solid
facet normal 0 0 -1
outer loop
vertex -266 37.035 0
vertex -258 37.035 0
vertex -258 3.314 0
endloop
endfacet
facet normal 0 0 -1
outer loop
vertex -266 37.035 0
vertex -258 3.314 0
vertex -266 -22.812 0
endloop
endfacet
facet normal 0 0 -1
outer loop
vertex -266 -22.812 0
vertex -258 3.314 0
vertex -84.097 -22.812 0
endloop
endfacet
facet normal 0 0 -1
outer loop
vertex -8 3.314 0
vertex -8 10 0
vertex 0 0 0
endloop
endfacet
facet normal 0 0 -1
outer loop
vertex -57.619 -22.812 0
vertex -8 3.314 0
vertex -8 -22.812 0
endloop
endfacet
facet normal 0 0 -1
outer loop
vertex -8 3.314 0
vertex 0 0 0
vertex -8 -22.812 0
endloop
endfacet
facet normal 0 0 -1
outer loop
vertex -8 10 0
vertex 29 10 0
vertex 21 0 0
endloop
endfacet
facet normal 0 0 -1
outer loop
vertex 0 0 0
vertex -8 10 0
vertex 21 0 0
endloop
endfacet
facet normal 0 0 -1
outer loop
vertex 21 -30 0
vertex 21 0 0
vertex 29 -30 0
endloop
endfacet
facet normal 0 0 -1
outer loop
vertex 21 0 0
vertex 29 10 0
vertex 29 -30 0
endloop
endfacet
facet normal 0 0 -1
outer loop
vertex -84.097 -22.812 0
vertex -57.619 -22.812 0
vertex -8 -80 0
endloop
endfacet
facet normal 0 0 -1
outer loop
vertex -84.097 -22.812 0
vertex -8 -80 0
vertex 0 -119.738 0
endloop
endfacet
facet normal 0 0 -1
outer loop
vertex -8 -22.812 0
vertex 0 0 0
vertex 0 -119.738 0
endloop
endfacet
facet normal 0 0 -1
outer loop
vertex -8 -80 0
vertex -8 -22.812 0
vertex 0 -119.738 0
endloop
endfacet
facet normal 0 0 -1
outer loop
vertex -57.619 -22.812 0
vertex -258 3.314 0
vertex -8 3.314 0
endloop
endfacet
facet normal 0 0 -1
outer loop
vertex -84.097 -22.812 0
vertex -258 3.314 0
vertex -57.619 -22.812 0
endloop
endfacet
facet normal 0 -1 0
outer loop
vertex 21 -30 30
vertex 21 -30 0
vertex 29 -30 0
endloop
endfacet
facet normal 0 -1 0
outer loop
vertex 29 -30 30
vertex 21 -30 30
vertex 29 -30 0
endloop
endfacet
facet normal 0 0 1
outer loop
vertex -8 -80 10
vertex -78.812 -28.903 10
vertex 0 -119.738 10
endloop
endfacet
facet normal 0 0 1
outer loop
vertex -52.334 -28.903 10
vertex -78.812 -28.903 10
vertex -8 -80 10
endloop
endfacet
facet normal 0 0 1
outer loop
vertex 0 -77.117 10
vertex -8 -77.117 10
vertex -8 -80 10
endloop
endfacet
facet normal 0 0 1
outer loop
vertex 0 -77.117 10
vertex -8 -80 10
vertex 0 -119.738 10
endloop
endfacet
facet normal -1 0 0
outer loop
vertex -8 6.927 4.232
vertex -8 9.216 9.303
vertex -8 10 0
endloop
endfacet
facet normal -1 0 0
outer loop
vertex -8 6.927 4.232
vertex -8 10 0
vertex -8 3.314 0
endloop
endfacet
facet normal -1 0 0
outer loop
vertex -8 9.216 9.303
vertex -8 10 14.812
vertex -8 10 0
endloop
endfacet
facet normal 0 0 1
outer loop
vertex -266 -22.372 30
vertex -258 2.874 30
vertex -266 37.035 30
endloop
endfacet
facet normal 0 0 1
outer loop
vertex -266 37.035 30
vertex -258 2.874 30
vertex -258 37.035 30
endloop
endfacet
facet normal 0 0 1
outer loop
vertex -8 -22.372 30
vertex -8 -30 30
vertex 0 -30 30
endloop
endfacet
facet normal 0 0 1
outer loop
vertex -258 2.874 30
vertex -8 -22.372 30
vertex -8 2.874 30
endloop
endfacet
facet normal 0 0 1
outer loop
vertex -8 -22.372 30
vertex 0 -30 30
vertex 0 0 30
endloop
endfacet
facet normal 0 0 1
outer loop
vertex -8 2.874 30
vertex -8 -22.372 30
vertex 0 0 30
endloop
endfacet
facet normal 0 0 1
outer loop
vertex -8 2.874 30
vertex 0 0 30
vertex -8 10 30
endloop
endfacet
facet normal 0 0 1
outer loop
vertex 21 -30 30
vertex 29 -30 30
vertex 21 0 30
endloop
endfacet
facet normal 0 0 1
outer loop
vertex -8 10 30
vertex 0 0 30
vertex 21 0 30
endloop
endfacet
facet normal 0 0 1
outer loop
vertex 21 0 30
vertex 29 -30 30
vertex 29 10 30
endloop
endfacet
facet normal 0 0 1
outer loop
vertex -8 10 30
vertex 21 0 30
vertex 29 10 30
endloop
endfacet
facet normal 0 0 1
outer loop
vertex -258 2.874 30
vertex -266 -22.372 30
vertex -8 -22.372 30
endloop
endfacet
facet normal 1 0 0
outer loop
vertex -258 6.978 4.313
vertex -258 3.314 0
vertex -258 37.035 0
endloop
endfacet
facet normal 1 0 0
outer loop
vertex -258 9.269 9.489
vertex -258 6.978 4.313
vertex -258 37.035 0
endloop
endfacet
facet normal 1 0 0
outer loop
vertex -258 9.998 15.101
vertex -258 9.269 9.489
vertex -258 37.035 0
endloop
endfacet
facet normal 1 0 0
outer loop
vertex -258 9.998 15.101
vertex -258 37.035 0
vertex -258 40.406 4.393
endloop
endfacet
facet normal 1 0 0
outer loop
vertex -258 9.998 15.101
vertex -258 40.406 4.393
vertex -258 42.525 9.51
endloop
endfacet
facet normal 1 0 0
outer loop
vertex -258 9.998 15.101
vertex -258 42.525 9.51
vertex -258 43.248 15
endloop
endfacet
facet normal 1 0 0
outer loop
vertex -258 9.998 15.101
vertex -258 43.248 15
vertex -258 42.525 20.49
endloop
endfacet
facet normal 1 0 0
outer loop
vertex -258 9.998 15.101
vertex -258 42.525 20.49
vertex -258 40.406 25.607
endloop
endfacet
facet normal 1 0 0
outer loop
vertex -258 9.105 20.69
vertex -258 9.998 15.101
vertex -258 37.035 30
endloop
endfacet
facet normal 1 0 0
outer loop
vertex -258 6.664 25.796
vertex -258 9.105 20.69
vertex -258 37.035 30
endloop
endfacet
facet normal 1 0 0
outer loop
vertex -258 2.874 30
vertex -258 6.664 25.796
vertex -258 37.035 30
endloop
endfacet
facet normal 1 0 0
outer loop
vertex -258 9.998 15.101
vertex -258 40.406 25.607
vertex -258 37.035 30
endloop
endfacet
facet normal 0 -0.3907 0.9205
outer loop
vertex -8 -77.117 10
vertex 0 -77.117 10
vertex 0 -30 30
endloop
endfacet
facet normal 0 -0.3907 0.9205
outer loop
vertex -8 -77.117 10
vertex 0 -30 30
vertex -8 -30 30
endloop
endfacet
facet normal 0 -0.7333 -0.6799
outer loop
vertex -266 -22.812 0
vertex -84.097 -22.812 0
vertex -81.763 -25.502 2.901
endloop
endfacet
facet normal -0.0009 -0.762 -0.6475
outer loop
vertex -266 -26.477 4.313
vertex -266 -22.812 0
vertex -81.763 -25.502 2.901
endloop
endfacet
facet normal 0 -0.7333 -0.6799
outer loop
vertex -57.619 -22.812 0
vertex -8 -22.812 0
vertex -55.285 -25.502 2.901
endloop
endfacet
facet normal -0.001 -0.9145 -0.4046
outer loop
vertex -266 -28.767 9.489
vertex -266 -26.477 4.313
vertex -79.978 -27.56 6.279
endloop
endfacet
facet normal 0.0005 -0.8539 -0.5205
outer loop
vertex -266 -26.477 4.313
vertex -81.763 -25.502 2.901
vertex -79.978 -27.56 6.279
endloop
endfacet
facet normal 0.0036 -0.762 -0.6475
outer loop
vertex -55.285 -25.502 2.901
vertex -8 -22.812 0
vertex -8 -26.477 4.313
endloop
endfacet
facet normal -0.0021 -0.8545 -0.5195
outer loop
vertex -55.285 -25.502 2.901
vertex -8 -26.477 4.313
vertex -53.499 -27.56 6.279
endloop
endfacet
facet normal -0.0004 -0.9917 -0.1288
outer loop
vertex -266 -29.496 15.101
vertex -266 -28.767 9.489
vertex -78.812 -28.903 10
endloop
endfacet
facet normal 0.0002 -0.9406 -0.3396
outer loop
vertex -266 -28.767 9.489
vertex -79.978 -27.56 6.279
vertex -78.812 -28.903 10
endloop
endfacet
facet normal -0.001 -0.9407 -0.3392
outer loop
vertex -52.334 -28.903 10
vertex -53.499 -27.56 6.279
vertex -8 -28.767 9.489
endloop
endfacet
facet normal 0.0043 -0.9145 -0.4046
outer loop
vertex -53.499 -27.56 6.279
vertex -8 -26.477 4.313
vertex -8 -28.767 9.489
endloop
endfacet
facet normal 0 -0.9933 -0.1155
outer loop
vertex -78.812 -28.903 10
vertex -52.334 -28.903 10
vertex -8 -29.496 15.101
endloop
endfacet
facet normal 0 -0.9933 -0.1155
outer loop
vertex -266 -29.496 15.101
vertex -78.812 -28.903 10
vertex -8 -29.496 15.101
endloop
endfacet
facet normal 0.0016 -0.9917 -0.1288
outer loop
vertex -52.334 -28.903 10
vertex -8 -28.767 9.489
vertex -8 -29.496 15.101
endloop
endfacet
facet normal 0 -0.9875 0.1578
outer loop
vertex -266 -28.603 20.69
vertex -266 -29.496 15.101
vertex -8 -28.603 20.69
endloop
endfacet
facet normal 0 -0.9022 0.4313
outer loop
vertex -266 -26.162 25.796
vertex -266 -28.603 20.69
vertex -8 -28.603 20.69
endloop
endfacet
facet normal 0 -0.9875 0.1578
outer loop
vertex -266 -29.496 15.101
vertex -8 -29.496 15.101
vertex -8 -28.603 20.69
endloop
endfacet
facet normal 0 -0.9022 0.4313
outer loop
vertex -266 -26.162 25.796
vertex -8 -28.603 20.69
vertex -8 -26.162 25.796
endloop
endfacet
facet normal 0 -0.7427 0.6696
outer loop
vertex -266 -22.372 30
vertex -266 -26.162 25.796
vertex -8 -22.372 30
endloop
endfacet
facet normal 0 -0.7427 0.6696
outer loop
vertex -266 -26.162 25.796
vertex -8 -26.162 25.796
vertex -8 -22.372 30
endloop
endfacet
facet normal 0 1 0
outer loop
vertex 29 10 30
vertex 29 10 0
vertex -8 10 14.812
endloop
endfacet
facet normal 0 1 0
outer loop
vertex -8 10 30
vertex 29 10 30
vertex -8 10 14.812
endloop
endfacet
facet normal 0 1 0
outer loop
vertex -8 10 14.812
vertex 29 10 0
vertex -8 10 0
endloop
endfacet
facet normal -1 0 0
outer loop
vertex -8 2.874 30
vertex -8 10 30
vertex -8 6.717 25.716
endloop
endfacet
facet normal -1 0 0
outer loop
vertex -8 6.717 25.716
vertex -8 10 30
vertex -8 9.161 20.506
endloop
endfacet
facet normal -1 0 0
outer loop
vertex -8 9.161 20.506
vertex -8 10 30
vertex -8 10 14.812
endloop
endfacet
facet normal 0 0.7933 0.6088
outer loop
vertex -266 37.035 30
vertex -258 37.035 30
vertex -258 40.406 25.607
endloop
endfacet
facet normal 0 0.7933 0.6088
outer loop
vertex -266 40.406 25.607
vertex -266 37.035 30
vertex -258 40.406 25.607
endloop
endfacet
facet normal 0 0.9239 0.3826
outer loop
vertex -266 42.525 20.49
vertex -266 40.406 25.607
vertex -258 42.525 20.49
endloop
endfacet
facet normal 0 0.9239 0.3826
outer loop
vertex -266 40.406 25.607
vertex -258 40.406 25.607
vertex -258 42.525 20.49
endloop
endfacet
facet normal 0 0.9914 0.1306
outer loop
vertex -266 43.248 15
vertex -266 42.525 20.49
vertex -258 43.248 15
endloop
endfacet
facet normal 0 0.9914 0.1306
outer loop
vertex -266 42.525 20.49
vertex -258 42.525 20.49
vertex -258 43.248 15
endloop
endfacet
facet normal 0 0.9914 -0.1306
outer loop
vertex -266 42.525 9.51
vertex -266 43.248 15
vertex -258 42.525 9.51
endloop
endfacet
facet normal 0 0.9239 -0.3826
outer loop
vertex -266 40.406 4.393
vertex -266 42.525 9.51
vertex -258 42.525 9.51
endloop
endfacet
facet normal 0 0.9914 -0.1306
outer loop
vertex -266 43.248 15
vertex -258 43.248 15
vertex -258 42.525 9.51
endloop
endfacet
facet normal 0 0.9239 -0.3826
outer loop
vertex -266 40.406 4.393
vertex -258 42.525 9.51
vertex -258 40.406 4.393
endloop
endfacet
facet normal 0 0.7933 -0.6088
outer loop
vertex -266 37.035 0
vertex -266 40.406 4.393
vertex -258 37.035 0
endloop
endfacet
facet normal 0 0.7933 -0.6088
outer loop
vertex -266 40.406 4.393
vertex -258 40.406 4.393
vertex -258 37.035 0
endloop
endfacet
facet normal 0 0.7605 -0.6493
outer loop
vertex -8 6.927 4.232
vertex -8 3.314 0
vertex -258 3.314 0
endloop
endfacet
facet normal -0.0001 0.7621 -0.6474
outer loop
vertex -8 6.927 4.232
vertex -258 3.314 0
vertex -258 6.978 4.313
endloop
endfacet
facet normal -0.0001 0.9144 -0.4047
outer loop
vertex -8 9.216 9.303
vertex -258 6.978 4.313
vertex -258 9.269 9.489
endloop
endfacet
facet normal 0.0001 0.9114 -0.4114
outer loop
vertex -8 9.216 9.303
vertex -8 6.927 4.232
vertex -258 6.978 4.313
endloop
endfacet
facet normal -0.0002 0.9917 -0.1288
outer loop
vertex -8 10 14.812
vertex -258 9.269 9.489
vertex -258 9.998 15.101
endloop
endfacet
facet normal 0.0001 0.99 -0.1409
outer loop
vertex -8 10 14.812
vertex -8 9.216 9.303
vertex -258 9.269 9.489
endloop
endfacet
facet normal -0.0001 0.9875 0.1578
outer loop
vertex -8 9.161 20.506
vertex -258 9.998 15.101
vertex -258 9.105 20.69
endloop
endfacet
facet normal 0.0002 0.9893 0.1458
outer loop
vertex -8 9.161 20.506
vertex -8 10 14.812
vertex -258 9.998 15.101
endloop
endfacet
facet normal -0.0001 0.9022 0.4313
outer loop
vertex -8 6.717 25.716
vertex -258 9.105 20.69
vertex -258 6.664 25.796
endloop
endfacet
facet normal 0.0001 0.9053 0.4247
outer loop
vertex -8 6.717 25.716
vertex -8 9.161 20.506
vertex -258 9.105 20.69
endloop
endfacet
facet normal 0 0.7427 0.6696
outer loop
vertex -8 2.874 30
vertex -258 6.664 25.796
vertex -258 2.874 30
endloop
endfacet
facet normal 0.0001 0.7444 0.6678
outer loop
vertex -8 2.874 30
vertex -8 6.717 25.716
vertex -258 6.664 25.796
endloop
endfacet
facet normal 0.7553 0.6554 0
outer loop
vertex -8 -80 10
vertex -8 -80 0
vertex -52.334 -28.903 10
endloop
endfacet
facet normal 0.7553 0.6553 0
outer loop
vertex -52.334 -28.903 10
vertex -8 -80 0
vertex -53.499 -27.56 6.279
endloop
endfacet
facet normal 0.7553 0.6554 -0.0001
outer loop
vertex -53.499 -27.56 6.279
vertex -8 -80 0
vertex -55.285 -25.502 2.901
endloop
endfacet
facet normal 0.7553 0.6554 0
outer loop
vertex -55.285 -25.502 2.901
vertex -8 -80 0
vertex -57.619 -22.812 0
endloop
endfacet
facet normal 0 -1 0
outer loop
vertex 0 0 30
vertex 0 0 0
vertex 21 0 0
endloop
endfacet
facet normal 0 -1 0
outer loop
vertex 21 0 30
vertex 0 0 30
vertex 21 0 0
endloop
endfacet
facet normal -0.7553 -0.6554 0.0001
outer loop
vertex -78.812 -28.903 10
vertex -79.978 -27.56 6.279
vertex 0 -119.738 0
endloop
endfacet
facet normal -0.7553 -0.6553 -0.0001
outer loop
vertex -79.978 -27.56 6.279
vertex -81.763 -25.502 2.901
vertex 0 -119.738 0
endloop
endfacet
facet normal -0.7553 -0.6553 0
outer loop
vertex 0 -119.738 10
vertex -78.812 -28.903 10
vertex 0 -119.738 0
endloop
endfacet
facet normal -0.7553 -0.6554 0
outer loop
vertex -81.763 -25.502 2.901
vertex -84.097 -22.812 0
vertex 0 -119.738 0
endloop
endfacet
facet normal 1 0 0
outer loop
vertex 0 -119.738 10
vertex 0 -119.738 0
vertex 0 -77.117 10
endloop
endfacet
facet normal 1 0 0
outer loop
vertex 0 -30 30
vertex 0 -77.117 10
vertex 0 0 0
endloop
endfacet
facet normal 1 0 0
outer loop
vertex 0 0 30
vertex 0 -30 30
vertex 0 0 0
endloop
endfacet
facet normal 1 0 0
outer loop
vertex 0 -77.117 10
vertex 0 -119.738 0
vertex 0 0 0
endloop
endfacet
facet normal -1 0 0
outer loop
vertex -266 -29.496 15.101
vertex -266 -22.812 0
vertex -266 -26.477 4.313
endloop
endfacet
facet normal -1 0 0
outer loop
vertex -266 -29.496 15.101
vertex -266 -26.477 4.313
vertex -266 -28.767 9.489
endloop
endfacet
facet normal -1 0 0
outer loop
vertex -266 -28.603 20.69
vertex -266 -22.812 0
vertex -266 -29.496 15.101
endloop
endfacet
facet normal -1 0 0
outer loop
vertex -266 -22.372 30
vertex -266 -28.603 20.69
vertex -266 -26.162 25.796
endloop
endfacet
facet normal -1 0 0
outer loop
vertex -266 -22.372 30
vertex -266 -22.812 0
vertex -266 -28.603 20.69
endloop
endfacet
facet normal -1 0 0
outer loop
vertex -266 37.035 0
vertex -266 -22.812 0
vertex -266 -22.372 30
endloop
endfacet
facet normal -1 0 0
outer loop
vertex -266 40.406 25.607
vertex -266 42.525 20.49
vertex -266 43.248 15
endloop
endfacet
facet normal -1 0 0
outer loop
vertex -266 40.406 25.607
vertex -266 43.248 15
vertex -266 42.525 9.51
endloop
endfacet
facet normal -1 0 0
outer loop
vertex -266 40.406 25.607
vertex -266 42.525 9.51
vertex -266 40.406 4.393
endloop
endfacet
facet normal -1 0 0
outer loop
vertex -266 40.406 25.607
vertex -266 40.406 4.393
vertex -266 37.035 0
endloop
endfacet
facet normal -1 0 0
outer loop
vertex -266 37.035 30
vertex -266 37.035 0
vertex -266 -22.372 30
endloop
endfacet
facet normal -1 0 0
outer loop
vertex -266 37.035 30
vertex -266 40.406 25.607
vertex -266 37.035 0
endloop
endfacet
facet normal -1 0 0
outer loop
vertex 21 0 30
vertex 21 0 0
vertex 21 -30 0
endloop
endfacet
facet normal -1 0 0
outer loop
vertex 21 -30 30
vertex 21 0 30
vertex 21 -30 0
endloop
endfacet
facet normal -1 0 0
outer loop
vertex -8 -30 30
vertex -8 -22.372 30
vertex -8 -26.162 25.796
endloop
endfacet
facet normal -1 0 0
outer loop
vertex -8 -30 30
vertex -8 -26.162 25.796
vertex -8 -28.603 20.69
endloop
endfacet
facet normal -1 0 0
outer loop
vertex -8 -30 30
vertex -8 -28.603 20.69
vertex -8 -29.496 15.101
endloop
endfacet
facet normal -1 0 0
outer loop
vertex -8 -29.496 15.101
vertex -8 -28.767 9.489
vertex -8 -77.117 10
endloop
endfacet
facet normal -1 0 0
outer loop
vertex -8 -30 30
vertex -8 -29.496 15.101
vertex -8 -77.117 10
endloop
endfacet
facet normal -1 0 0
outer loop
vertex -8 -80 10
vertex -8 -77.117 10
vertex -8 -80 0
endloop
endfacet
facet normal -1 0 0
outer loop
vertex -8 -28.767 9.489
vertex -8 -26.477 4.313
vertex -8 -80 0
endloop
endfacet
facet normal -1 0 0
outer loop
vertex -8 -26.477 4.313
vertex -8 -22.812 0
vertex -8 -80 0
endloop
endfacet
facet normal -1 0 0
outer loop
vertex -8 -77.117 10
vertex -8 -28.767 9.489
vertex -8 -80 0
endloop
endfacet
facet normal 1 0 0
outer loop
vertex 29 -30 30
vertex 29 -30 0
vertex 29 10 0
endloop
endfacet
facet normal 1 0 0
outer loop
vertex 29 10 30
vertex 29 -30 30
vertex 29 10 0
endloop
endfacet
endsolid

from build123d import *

# Parameters (mm, degrees)
BOSS_EXTRUDE1_DEPTH = 30
BOSS_EXTRUDE2_DEPTH = 250
BOSS_EXTRUDE3_DEPTH = 8
BOSS_EXTRUDE4_DEPTH = 10
CHAMFER1_SIZE2      = 47.117047316
CHAMFER1_SIZE       = 20


with BuildPart() as part:
    # Sketch1 → Boss-Extrude1 (new body)
    with BuildSketch(Plane.XY):
        Polygon((0, 0), (21, 0), (21, -30), (29, -30), (29, 10), (-8, 10), (-8, -30), (0, -30), align=None)
    extrude(amount=BOSS_EXTRUDE1_DEPTH)

    # Sketch2 → Boss-Extrude2 (add)
    with BuildSketch(Plane.ZY.offset(8)):
        with BuildLine():
            Line((0, -22.811969958), (0, 3.313687916))
            ThreePointArc((0, 3.313687916), (15.101138891, 9.997881194), (30, 2.874204248))
            Line((30, 2.874204248), (30, -22.37248629))
            ThreePointArc((30, -22.37248629), (15.101138891, -29.496163235), (0, -22.811969958))
        make_face()
    extrude(amount=BOSS_EXTRUDE2_DEPTH)

    # Sketch3 → Boss-Extrude3 (add)
    with BuildSketch(Plane.ZY.offset(258)):
        with BuildLine():
            Line((30, -22.37248629), (30, 37.034794094))
            ThreePointArc((30, 37.034794094), (15, 43.247997529), (0, 37.034794094))
            Line((0, 37.034794094), (0, -22.811969958))
            ThreePointArc((0, -22.811969958), (15.101138891, -29.496163235), (30, -22.37248629))
        make_face()
    extrude(amount=BOSS_EXTRUDE3_DEPTH)

    # Sketch4 → Boss-Extrude4 (add)
    with BuildSketch(Plane.XY):
        Polygon((-84.478678947, -22.37248629), (0, -119.738410874), (0, -30), (-8, -30), (-8, -80), (-58, -22.37248629), align=None)
    extrude(amount=BOSS_EXTRUDE4_DEPTH)

    # Chamfer1
    chamfer1_edges = [part.edges().sort_by_distance(p)[0] for p in [
        (-4, -30, 10),
    ]]
    chamfer1_side = [part.faces().sort_by_distance(p)[0] for p in [
        (-4, -30, 10.4),
    ]]
    chamfer(chamfer1_edges, length=CHAMFER1_SIZE - 0.0001, length2=CHAMFER1_SIZE2 - 0.0001, reference=chamfer1_side[0])  # a hair under: the kernel refuses the full size


solid = part.part
